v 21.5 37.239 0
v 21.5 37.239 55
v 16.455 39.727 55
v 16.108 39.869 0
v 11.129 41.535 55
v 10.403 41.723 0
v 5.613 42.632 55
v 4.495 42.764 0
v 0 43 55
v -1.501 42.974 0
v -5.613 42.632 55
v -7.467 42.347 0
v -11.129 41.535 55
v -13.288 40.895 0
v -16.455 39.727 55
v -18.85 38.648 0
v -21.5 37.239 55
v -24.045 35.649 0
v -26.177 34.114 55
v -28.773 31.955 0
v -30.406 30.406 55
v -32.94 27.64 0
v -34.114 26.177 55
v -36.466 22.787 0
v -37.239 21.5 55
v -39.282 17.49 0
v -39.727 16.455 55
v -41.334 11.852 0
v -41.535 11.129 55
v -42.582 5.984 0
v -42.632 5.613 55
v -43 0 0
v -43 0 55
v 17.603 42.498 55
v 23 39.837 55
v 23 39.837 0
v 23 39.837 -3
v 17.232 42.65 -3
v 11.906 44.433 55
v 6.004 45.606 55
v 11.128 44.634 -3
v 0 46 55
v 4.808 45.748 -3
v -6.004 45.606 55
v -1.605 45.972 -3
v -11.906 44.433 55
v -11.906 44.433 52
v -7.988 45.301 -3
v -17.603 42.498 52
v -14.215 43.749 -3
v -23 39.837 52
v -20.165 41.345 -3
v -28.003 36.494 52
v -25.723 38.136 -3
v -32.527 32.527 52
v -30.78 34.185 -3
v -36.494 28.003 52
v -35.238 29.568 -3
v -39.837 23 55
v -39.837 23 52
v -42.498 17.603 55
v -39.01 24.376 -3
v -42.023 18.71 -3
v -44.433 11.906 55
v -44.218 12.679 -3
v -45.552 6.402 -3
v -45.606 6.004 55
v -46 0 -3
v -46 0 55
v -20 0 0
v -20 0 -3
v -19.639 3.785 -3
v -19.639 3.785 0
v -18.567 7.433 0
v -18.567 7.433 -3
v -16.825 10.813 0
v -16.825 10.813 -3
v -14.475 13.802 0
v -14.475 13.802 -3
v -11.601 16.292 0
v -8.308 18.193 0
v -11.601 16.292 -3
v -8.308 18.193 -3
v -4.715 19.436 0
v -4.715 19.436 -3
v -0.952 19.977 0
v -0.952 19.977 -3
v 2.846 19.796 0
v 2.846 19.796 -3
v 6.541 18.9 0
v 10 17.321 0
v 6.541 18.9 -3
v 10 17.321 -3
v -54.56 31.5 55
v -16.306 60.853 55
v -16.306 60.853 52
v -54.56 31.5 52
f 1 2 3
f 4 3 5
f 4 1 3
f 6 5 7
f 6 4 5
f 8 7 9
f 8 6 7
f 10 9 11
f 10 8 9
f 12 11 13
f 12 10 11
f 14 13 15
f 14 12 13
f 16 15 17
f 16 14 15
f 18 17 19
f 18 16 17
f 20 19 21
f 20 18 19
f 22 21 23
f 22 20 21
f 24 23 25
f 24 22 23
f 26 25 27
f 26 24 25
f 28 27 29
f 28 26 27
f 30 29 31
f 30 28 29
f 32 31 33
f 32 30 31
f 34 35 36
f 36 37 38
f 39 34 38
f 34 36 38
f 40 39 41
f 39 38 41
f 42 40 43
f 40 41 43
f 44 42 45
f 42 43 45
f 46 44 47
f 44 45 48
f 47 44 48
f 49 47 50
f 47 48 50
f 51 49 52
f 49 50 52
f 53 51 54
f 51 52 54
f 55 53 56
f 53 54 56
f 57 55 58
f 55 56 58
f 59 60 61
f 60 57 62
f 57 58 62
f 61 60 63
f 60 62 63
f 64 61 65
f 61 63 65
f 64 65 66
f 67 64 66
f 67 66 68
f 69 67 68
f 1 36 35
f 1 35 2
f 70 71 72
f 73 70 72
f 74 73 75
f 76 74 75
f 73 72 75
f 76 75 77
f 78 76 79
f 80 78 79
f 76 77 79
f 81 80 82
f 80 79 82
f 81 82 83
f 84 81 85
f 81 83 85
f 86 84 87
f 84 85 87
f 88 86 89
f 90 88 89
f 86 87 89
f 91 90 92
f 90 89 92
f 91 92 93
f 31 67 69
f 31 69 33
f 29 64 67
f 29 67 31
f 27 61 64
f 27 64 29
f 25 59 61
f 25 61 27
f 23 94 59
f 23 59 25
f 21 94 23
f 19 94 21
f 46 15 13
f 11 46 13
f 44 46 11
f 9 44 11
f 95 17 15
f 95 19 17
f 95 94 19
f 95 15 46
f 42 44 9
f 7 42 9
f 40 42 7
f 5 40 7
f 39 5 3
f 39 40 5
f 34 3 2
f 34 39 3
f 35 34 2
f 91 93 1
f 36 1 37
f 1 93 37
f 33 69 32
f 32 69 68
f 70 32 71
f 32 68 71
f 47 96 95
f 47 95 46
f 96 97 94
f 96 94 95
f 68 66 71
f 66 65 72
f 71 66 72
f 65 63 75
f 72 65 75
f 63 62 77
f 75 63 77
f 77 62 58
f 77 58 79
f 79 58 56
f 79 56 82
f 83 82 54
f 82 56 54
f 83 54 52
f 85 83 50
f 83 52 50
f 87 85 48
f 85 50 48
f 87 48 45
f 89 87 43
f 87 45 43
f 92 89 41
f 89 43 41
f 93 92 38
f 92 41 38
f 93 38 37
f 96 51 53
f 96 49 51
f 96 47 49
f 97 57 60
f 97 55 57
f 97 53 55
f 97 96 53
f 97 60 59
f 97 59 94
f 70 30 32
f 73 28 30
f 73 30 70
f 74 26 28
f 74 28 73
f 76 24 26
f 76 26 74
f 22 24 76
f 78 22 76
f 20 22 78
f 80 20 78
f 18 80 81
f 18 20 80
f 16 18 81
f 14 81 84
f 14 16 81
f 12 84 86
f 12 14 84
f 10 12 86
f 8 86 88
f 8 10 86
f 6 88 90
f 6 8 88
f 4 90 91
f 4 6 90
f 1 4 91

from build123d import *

# Parameters (mm, degrees)
SKETCH1_R           = 46
SKETCH1_R_2         = 43
BOSS_EXTRUDE1_DEPTH = 55
BOSS_EXTRUDE2_START = 3
BOSS_EXTRUDE2_DEPTH = 3
CUT_EXTRUDE1_DEPTH  = 58
BOSS_EXTRUDE3_START = -3
BOSS_EXTRUDE3_DEPTH = 3


with BuildPart() as part:
    # Sketch1 → Boss-Extrude1 (new body)
    with BuildSketch(Plane.XY):
        Circle(SKETCH1_R)
        Circle(SKETCH1_R_2, mode=Mode.SUBTRACT)
    extrude(amount=BOSS_EXTRUDE1_DEPTH)

    # Sketch2 → Boss-Extrude2 (add)
    with BuildSketch(Plane(origin=(0, 0, 0), x_dir=(-1, 0, 0), z_dir=(0, 0, -1)).offset(BOSS_EXTRUDE2_START)):
        with BuildLine():
            Line((-10, 17.320508076), (-23, 39.837168574))
            ThreePointArc((-23, 39.837168574), (23, 39.837168574), (46, 0))
            Line((46, 0), (20, 0))
            ThreePointArc((20, 0), (10, 17.320508076), (-10, 17.320508076))
        make_face()
    extrude(amount=-BOSS_EXTRUDE2_DEPTH)

    # Sketch3 → Cut-Extrude1 (cut)
    with BuildSketch(Plane(origin=(0, 0, -3), x_dir=(-1, 0, 0), z_dir=(0, 0, -1))):
        with BuildLine():
            Line((-23, 39.837168574), (-21.5, 37.239092363))
            ThreePointArc((-21.5, 37.239092363), (-21.5, -37.239092363), (43, 0))
            Line((43, 0), (46, 0))
            ThreePointArc((46, 0), (-23, -39.837168574), (-23, 39.837168574))
        make_face()
    extrude(amount=-CUT_EXTRUDE1_DEPTH, mode=Mode.SUBTRACT)

    # Sketch4 → Boss-Extrude3 (add)
    with BuildSketch(Plane.XY.offset(55).offset(BOSS_EXTRUDE3_START)):
        with BuildLine():
            Line((-37.239092363, 21.5), (-54.559600438, 31.5))
            Line((-54.559600438, 31.5), (-16.305599841, 60.853327056))
            Line((-16.305599841, 60.853327056), (-11.129218939, 41.53481053))
            ThreePointArc((-11.129218939, 41.53481053), (-26.176741447, 34.114193633), (-37.239092363, 21.5))
        make_face()
    extrude(amount=BOSS_EXTRUDE3_DEPTH)


solid = part.part
